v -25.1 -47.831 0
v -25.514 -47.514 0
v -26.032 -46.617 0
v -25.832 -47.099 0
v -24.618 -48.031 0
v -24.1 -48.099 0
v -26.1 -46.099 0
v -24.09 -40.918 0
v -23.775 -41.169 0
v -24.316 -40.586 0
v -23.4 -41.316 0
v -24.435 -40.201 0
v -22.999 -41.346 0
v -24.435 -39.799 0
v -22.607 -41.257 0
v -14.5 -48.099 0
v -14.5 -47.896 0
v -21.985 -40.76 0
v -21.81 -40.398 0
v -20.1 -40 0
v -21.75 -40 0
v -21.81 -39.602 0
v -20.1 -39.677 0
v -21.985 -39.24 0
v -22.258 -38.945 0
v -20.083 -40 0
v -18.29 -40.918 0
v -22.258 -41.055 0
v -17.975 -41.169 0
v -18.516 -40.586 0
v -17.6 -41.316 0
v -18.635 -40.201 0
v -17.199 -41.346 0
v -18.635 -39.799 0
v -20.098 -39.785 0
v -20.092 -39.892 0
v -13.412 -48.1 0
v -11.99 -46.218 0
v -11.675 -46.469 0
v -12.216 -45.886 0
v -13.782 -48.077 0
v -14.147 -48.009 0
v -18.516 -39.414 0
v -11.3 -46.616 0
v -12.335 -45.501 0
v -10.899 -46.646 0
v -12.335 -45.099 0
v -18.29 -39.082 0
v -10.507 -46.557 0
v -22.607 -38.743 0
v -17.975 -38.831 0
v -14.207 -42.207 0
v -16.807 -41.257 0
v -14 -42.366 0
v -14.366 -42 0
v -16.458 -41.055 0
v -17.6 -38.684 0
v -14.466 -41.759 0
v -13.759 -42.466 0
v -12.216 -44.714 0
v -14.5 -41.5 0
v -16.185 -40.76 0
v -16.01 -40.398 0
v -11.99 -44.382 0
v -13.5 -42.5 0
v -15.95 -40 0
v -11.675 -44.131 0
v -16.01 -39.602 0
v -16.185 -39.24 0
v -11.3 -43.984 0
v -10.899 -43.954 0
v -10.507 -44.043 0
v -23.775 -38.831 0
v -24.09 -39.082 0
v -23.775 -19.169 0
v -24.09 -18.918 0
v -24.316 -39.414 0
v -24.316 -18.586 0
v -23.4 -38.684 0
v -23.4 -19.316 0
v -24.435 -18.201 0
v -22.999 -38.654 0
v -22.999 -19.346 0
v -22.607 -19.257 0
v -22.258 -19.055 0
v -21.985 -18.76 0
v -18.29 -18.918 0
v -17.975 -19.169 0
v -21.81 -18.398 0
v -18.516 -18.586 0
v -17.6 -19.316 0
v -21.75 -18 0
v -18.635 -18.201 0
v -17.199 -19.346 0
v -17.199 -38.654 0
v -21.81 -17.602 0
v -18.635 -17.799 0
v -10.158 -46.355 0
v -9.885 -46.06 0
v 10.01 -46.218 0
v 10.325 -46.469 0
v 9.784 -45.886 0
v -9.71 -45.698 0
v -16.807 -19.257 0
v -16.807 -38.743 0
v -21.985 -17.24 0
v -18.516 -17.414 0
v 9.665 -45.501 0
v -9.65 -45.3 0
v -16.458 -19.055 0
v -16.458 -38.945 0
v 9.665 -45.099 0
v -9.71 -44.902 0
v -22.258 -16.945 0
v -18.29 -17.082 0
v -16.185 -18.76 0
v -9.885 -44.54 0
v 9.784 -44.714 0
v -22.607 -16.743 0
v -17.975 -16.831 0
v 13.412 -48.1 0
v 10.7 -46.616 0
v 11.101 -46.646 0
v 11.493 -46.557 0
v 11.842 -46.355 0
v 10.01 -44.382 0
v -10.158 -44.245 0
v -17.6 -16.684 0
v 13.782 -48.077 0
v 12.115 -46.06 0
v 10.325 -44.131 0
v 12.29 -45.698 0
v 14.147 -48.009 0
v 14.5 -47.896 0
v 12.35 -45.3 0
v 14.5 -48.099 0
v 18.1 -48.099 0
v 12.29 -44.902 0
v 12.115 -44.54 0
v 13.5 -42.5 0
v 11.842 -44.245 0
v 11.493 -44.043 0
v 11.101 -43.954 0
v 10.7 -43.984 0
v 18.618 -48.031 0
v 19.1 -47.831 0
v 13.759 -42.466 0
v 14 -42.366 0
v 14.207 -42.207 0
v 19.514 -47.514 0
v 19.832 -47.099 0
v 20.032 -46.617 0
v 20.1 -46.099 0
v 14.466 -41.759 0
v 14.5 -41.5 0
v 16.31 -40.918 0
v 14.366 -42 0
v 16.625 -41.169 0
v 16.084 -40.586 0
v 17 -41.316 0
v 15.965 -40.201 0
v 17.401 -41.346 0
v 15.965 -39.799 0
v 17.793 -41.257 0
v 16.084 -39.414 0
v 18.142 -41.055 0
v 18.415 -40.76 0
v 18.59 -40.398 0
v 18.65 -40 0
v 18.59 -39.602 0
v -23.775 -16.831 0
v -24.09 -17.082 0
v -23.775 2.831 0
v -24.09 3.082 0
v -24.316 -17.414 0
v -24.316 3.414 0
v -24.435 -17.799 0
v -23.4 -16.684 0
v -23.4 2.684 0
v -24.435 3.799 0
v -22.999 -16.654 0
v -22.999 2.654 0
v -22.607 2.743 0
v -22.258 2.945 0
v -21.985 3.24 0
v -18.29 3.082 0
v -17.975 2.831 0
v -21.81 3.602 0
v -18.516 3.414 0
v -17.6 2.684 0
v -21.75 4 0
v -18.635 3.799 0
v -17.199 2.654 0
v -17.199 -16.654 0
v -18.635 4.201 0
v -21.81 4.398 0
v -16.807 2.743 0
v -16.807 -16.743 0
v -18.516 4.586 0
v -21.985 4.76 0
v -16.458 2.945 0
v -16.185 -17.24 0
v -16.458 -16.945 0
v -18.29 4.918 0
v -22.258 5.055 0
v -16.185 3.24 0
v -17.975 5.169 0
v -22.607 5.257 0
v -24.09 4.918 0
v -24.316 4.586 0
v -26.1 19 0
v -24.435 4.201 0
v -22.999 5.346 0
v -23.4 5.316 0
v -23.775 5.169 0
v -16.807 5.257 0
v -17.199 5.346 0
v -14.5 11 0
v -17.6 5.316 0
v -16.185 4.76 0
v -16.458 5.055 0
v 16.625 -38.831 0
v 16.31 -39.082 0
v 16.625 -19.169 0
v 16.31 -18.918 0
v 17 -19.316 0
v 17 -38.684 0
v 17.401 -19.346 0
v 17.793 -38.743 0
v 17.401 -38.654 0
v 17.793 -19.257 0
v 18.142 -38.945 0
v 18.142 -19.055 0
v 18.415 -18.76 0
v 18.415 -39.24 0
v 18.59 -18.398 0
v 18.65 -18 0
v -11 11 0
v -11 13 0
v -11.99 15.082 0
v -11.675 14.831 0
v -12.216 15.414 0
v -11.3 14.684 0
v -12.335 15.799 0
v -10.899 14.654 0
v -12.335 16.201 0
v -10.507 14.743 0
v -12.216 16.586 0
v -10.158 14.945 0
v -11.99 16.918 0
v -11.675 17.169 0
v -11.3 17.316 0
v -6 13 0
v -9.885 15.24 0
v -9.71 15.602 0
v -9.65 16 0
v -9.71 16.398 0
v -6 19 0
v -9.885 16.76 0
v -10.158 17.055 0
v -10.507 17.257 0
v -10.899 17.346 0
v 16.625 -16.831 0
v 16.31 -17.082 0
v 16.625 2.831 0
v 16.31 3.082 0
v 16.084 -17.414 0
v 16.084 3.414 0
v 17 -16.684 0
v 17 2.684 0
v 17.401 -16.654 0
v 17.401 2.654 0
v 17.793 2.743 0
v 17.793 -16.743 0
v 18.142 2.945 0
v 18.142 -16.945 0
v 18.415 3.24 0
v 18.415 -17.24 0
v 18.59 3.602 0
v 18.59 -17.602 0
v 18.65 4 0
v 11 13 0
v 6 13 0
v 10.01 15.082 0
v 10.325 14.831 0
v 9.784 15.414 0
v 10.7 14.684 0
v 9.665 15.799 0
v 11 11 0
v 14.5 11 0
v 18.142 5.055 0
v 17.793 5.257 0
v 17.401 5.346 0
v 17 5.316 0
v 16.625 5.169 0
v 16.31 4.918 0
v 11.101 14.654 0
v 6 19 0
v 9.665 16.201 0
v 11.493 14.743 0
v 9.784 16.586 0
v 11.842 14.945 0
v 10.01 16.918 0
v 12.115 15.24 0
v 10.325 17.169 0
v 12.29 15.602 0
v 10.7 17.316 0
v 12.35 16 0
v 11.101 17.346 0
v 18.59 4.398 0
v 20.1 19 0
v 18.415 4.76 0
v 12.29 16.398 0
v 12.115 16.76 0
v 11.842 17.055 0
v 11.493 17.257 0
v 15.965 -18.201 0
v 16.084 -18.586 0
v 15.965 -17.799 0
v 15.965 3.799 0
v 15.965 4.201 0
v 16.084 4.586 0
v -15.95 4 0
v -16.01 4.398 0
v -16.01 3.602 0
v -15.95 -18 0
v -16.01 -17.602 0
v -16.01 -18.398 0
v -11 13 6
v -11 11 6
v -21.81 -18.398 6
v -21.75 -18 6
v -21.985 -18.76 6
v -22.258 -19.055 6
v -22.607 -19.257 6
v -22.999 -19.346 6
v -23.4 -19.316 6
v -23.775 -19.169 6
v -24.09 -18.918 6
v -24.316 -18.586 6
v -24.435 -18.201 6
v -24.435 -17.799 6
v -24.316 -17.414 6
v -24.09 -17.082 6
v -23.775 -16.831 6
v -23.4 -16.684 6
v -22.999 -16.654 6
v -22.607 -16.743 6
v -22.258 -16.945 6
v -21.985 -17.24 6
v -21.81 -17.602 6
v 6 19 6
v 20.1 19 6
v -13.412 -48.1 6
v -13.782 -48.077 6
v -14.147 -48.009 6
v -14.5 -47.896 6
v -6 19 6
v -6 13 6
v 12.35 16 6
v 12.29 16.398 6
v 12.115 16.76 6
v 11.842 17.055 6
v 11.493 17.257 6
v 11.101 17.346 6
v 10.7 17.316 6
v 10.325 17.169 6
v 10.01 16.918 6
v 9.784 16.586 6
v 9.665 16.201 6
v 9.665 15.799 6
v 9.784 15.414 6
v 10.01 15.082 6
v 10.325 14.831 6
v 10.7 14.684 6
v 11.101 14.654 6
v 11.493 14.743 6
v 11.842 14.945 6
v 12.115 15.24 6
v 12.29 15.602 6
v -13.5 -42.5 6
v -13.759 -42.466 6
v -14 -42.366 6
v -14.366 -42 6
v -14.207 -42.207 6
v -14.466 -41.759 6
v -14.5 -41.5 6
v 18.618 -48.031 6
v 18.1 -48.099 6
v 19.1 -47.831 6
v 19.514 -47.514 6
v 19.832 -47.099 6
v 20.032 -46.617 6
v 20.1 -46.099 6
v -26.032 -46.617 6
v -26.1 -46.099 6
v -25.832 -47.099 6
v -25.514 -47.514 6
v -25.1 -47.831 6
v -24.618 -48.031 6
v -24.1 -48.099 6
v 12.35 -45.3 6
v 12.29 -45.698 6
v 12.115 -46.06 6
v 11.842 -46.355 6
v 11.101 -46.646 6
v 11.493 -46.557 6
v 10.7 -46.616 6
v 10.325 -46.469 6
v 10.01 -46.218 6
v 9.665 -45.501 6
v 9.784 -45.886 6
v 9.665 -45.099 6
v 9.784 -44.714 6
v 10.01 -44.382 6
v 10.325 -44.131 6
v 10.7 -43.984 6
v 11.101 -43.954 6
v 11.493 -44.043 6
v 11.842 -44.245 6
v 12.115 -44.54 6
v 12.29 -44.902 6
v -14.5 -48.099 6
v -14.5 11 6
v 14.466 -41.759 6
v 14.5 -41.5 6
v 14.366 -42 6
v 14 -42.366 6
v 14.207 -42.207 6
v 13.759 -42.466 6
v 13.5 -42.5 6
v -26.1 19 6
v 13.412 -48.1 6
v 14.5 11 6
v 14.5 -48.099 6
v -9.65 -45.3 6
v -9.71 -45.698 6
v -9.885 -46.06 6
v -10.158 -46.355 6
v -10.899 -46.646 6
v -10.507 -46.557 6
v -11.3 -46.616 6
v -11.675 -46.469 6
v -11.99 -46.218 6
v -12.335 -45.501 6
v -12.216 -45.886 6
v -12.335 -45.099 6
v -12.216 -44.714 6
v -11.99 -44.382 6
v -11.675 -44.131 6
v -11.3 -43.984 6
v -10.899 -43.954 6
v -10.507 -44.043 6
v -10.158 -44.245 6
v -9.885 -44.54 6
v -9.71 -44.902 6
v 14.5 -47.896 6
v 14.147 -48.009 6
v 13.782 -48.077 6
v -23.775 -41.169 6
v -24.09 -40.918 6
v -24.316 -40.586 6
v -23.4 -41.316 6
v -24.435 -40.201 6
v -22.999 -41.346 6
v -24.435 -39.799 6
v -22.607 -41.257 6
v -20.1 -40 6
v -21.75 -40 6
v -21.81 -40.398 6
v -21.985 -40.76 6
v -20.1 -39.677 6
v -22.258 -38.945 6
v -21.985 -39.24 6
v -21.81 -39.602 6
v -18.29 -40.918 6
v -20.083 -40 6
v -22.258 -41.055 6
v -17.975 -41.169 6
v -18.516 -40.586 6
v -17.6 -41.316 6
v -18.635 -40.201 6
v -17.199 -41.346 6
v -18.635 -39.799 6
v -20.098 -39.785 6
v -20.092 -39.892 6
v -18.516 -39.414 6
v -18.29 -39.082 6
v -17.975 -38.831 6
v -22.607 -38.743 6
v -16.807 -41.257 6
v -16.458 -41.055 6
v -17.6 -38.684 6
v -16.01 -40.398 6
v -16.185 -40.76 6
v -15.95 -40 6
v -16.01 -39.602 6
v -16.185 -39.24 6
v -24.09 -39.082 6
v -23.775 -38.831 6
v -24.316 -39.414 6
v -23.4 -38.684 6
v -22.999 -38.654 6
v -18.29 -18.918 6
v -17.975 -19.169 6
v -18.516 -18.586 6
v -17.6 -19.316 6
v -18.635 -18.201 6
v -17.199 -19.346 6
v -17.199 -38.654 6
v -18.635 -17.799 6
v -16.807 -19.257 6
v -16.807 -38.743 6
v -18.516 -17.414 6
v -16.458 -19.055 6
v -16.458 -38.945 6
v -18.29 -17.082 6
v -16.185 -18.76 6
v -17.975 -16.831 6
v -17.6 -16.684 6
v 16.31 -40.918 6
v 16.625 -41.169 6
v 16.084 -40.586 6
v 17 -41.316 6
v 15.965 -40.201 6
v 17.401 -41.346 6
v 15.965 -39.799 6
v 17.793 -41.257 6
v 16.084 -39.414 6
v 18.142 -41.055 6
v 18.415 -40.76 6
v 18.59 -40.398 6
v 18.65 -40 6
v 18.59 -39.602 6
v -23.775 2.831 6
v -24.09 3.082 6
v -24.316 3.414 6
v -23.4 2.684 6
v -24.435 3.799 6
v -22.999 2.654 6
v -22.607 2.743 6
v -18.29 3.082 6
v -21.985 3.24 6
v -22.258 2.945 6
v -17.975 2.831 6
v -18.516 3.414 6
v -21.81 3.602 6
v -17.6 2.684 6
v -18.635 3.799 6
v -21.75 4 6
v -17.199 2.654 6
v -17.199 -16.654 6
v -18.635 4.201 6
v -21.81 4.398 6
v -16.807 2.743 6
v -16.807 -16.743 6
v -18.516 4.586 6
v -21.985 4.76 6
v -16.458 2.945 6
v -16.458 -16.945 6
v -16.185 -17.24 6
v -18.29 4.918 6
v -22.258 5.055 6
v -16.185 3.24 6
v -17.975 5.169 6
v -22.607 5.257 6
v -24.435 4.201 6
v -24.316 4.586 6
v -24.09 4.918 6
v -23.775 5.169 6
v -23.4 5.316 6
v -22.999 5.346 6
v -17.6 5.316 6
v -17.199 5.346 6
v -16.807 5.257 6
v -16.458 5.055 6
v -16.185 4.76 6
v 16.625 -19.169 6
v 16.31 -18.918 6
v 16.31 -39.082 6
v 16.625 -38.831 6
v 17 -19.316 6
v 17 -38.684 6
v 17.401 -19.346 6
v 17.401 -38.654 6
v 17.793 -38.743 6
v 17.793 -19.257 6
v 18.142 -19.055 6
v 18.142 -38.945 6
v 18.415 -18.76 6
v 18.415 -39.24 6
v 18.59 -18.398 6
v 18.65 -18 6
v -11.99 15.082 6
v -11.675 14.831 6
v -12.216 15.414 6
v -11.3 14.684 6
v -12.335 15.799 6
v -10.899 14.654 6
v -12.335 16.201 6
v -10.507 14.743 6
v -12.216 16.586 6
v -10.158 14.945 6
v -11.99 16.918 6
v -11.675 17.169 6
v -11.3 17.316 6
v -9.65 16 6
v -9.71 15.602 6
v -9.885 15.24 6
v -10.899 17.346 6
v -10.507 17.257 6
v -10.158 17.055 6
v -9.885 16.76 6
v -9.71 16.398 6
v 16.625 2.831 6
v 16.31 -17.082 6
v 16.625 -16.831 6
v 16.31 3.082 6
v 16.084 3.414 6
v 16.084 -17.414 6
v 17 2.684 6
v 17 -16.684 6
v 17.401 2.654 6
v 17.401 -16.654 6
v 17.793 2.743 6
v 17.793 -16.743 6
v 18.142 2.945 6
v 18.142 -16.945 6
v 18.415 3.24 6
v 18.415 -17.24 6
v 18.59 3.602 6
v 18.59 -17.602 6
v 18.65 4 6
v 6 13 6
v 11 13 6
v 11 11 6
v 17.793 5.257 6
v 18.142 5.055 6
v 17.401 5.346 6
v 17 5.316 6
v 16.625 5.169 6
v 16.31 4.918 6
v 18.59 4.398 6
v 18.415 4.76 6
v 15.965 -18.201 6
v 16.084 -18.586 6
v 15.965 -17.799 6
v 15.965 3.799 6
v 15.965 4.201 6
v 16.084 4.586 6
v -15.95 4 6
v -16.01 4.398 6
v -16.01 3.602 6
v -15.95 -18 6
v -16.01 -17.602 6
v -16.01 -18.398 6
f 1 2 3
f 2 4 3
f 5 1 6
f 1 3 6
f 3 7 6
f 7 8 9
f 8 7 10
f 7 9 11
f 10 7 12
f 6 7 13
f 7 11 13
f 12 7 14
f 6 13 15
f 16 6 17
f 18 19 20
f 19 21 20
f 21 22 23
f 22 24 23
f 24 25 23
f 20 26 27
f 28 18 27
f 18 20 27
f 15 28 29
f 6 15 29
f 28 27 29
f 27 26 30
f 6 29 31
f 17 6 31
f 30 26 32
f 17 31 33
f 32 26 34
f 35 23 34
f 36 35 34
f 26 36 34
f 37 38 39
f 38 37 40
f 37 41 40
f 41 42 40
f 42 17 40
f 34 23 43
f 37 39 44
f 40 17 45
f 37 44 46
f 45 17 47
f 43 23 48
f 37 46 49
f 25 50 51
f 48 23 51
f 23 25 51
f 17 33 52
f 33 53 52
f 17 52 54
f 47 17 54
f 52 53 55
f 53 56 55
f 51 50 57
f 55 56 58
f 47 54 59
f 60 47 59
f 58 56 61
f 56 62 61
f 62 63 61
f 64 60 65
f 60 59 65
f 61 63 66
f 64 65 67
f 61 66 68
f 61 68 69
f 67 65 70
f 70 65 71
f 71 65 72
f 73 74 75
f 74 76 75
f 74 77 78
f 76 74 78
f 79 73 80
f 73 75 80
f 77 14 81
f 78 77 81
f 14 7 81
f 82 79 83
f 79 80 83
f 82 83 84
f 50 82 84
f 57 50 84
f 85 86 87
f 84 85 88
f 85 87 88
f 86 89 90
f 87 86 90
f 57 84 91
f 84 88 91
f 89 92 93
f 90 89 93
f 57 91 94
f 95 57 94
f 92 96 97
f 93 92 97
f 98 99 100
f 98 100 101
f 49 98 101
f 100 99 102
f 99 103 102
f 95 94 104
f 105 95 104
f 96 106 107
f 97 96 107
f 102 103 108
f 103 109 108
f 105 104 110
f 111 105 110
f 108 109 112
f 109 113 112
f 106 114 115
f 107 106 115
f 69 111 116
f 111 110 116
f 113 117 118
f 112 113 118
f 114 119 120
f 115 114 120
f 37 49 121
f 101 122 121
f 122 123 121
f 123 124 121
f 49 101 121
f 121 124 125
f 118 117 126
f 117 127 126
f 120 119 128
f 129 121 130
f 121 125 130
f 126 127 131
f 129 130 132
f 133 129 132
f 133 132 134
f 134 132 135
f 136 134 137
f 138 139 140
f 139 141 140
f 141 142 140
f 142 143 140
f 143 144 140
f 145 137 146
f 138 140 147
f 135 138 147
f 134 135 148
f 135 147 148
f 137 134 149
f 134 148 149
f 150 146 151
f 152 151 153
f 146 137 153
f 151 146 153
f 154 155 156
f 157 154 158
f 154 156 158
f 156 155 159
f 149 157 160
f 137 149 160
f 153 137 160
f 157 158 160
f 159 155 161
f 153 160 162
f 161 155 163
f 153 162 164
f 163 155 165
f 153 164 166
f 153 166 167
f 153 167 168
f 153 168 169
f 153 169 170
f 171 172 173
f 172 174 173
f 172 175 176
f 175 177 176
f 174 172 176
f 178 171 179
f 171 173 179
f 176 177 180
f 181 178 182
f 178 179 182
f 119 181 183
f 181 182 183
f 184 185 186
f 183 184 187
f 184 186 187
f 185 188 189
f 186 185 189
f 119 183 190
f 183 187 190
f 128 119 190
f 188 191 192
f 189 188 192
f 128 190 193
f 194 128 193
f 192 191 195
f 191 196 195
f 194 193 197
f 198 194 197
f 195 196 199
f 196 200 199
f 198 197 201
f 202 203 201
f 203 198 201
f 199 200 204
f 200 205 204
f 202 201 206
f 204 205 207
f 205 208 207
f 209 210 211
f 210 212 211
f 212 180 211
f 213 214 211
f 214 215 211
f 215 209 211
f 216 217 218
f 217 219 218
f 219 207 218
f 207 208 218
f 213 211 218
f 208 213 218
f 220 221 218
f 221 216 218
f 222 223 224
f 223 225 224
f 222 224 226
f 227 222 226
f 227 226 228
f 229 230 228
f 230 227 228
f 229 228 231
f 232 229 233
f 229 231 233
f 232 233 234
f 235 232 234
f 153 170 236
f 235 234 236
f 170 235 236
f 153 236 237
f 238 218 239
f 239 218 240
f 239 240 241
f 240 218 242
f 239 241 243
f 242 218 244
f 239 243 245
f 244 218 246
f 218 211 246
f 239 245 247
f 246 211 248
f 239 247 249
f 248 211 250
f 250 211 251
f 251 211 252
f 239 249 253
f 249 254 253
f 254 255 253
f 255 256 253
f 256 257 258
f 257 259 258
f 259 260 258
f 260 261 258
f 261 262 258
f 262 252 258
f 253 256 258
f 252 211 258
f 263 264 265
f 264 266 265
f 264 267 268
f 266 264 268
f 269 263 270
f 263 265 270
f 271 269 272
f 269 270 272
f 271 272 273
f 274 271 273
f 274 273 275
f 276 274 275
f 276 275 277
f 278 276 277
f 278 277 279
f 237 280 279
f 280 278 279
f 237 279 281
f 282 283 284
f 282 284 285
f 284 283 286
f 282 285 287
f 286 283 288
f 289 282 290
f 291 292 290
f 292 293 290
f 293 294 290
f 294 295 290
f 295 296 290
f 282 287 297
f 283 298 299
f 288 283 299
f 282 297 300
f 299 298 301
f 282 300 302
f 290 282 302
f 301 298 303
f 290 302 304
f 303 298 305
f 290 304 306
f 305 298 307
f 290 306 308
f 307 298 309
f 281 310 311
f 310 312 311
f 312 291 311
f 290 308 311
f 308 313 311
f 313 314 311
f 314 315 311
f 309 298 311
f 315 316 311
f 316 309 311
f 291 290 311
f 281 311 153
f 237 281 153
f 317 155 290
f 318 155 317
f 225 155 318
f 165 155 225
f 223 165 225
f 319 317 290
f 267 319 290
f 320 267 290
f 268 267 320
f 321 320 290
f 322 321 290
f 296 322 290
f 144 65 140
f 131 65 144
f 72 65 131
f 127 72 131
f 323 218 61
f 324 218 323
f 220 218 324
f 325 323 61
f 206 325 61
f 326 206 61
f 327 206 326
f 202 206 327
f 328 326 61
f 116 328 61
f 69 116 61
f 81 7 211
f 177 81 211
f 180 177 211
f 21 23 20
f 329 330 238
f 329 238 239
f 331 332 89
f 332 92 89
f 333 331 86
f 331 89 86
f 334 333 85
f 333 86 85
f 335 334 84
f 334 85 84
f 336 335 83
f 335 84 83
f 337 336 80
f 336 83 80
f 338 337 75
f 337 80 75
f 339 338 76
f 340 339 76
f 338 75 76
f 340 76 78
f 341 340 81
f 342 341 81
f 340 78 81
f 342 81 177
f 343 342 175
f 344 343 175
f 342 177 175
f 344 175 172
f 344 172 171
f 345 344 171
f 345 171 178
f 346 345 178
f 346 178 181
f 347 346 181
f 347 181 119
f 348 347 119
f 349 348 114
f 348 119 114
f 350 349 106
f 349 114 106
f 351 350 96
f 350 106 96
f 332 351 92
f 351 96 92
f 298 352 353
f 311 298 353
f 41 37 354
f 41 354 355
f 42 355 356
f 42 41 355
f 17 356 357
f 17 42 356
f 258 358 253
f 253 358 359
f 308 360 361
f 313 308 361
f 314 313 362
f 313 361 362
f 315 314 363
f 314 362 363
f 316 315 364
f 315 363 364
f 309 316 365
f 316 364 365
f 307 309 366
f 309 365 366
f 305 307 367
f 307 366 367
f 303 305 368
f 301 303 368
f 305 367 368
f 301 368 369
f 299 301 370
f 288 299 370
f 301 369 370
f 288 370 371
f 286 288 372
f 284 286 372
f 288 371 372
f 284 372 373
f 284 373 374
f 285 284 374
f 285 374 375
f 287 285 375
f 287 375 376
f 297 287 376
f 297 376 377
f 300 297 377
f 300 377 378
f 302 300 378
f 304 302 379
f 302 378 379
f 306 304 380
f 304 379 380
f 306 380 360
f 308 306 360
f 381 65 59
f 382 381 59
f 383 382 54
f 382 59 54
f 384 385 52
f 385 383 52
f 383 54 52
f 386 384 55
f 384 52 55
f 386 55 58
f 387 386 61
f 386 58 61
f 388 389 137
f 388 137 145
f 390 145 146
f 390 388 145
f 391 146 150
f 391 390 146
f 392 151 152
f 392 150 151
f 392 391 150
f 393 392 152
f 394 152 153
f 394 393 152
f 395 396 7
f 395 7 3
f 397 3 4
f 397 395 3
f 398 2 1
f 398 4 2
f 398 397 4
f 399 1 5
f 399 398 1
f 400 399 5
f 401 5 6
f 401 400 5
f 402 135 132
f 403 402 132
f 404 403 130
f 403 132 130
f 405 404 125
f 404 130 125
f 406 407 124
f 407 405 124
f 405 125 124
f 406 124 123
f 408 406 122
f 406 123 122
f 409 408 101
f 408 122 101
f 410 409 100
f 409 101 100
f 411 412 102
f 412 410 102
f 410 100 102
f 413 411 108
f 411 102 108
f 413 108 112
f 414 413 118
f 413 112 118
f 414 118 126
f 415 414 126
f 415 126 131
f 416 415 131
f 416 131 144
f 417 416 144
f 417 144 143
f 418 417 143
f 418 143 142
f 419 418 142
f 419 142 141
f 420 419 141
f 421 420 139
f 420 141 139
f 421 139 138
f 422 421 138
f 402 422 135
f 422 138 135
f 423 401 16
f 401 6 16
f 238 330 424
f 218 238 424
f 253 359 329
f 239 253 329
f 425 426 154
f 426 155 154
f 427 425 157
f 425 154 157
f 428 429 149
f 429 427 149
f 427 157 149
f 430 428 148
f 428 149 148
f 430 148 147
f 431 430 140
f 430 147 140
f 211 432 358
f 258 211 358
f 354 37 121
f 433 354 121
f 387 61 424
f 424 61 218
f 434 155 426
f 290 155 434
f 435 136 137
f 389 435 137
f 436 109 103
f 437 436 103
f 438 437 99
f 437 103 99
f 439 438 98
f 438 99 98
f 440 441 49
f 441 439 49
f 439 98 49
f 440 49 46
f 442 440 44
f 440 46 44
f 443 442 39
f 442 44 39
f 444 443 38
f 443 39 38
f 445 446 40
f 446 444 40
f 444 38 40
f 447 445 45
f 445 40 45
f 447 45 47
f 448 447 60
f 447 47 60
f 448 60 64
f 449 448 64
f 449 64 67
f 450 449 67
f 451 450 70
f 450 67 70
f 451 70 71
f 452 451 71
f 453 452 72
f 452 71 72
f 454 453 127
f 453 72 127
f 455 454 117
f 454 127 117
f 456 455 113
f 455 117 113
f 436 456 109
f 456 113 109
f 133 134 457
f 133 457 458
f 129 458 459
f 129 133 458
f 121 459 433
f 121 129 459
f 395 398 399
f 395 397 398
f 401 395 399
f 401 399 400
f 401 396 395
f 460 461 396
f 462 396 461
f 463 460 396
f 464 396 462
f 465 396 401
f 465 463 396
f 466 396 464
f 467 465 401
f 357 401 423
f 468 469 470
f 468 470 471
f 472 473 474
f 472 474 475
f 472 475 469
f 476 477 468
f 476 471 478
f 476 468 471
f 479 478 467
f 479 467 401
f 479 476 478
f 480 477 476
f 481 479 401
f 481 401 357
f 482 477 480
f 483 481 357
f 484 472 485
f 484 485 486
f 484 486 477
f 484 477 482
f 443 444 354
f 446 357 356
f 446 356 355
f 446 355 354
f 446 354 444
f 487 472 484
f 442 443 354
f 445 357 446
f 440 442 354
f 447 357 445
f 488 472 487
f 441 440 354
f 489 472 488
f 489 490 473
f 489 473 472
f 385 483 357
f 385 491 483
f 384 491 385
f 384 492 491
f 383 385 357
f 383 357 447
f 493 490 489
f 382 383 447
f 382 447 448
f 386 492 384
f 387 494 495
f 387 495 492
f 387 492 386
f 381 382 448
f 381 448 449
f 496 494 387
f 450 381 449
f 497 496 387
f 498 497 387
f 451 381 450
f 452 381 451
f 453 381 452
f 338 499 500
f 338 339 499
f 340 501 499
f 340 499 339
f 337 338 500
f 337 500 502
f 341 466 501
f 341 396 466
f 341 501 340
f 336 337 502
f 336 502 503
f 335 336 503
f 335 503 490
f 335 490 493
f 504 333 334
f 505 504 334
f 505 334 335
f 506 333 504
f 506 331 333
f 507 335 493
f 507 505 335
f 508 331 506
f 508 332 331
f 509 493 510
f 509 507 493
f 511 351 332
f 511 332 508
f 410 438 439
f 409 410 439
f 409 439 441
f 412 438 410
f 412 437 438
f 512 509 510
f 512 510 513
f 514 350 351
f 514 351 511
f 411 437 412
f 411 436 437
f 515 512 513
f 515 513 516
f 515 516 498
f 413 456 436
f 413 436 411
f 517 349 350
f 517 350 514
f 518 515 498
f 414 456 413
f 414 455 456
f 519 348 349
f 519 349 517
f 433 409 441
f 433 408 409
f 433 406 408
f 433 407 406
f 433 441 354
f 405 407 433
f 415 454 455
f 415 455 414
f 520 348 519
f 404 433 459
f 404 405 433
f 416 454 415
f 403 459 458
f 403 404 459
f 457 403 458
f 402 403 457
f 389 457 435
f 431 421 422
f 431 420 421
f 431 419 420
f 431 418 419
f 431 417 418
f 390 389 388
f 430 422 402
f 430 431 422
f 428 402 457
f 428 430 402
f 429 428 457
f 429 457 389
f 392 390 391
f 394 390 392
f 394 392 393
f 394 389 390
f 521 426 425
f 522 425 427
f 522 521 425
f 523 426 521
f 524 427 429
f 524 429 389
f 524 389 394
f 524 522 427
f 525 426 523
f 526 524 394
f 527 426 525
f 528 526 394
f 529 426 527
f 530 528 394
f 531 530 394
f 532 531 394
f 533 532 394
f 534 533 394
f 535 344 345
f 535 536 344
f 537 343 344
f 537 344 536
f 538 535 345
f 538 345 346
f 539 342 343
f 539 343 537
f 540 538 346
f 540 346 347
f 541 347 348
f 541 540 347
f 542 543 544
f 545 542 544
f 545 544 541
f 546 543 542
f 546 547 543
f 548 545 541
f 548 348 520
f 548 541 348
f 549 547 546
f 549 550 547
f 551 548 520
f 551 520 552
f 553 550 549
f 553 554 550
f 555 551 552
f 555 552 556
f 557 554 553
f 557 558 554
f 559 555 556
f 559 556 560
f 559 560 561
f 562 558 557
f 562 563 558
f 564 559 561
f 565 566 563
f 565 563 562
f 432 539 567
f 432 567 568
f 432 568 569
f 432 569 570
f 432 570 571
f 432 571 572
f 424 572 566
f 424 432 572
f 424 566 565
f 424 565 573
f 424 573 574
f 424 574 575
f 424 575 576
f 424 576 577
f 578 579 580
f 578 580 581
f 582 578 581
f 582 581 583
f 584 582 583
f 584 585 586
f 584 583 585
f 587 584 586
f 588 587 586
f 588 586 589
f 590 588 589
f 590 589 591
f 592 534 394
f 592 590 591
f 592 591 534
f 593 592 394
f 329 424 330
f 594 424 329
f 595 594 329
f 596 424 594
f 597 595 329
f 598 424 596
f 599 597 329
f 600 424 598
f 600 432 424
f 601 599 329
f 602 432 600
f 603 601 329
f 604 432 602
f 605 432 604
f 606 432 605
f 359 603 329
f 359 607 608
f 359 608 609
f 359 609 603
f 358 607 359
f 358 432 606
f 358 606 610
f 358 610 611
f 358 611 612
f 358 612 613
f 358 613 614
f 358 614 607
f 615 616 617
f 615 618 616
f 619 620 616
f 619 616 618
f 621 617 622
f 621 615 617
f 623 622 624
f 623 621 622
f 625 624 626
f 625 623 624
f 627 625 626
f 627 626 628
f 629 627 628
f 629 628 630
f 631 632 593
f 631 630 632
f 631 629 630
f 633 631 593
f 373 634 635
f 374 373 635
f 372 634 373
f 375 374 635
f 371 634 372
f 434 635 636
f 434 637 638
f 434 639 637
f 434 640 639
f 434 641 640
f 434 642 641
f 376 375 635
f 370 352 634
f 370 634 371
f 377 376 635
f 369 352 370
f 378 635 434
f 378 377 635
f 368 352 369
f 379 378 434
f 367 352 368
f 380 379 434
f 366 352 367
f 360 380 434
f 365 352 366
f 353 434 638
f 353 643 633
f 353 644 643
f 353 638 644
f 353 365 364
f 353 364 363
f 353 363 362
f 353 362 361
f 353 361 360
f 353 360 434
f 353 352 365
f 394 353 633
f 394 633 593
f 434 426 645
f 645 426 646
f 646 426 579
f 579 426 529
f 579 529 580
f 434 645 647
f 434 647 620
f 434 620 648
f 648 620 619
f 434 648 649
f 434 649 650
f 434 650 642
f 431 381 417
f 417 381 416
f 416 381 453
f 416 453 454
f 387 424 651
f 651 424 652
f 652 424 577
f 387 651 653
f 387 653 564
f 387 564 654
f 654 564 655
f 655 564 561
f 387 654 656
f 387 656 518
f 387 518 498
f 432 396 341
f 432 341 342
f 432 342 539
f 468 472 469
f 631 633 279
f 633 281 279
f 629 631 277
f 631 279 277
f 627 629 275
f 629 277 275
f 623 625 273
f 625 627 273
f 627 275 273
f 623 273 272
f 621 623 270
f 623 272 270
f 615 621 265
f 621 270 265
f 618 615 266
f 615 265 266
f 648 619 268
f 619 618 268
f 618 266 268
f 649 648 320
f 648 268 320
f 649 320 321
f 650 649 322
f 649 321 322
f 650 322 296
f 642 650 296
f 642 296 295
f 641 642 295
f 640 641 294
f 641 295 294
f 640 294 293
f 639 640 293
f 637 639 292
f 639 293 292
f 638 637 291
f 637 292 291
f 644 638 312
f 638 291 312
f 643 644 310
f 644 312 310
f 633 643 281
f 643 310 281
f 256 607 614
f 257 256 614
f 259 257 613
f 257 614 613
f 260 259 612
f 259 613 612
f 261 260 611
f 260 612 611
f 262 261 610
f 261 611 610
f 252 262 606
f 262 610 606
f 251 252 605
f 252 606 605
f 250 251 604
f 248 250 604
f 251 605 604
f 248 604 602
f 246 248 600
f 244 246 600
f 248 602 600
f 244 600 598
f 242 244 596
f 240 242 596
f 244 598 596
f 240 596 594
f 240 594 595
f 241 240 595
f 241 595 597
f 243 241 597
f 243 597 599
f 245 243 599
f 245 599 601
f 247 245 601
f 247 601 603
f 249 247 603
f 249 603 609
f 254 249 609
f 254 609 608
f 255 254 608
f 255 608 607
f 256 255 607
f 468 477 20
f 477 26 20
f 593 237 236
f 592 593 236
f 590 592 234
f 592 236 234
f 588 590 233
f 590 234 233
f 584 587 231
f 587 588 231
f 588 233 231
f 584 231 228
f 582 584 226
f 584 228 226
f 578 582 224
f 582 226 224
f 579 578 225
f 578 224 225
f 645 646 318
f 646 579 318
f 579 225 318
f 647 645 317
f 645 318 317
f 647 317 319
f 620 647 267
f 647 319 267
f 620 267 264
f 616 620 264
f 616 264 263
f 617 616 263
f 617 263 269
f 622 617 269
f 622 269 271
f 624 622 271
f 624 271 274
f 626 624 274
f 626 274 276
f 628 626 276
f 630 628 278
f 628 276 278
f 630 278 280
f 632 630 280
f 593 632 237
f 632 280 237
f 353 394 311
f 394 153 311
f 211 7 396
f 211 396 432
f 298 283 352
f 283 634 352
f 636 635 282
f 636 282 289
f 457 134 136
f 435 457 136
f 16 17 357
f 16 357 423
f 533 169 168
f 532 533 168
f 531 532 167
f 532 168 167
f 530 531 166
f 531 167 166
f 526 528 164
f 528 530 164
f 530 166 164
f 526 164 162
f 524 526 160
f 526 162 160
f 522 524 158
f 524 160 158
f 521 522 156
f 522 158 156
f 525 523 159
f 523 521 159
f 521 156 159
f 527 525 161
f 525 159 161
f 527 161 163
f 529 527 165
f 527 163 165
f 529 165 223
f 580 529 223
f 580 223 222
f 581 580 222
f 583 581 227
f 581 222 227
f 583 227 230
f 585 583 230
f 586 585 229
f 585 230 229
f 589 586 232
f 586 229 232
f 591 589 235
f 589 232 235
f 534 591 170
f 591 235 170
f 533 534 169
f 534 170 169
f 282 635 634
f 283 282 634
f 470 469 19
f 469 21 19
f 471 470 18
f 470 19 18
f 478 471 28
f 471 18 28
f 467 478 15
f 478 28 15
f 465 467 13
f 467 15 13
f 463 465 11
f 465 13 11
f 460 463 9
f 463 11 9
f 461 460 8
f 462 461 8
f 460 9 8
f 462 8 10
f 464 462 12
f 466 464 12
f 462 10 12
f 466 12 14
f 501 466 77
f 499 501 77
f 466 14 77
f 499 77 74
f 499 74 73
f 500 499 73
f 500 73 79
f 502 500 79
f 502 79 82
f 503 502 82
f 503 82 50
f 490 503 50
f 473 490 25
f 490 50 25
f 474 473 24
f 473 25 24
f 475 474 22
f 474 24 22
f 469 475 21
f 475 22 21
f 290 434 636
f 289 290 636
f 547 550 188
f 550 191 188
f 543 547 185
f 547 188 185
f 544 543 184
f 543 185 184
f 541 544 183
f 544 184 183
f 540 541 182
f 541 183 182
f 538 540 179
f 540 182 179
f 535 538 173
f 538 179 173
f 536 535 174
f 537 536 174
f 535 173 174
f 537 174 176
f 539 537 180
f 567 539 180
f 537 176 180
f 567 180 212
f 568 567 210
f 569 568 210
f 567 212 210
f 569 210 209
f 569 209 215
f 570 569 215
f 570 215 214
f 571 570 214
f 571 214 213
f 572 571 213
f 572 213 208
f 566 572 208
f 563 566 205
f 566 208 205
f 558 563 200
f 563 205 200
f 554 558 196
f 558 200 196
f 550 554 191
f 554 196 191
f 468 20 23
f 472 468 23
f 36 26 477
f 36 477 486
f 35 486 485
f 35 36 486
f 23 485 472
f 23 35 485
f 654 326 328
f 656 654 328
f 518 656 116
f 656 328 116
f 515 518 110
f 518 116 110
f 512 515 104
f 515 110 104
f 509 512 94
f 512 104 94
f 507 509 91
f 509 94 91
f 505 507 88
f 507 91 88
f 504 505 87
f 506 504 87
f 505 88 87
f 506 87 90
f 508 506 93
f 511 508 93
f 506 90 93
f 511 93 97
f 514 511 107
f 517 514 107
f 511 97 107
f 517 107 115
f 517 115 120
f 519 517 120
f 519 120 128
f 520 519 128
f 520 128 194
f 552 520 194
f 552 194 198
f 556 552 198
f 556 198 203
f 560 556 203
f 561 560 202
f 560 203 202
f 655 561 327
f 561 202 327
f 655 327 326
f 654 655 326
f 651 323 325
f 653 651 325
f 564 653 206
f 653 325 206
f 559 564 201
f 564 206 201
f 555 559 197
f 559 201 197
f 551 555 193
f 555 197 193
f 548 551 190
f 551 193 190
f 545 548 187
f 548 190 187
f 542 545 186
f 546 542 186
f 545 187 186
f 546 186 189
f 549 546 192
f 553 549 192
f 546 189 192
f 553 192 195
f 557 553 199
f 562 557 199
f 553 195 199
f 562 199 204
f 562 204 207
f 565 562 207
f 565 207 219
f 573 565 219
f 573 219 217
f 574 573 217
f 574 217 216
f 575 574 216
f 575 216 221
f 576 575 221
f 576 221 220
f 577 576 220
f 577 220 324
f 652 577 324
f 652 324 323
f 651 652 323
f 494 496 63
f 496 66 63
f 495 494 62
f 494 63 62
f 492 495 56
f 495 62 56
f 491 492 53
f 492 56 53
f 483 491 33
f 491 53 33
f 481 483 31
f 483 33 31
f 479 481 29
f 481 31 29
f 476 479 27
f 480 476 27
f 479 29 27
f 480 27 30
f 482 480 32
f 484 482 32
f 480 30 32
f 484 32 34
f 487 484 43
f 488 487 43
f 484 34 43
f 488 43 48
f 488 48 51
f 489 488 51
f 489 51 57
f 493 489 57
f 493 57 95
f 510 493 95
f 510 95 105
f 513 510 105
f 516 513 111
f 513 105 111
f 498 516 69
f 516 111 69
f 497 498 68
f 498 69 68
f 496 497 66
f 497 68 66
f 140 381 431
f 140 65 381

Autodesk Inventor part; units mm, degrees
ref_plane "YZ Plane" through (0, 0, 0) normal (1, 0, 0) x (0, 1, 0)
ref_plane "XZ Plane" through (0, 0, 0) normal (0, 1, 0) x (-1, 0, 0)
ref_plane "XY Plane" through (0, 0, 0) normal (0, 0, 1) x (1, 0, 0)
ref_plane "작업 평면1" through (0, 0, 0) normal (0, 0, 1) x (1, 0, 0)
sketch "스케치1" plane through (0, 0, 0) normal (0, 0, 1) x (1, 0, 0)
  arc A0 (20.1, 4.5766) -> (19.5808, 6.2636) centre (17.1, 4.5766) ccw projected
  line L0 (19.5808, 6.2636) -> (15.5953, 12.1246) projected
  arc A1 (15.5953, 12.1246) -> (13.9414, 13) centre (13.9414, 11) ccw projected
  line L1 (13, 13) -> (13.9414, 13) projected
  arc A2 (14.5, 11.5) -> (13, 13) centre (13, 11.5) ccw projected
  line L2 (14.5, -41.5) -> (14.5, 11.5) projected
  arc A3 (13.5, -42.5) -> (14.5, -41.5) centre (13.5, -41.5) ccw projected
  line L3 (-13.5, -42.5) -> (13.5, -42.5) projected
  arc A4 (-14.5, -41.5) -> (-13.5, -42.5) centre (-13.5, -41.5) ccw projected
  line L4 (-14.5, 11.5) -> (-14.5, -41.5) projected
  arc A5 (-13, 13) -> (-14.5, 11.5) centre (-13, 11.5) ccw projected
  line L5 (-13.9414, 13) -> (-13, 13) projected
  arc A6 (-13.9414, 13) -> (-15.5953, 12.1246) centre (-13.9414, 11) ccw projected
  line L6 (-15.5953, 12.1246) -> (-19.5808, 6.2636) projected
  arc A7 (-19.5808, 6.2636) -> (-20.1, 4.5766) centre (-17.1, 4.5766) ccw projected
  line L7 (-20.1, 4.5766) -> (-20.1, -39.6766) projected
  arc A8 (-20.1, -39.6766) -> (-19.5808, -41.3636) centre (-17.1, -39.6766) ccw projected
  line L8 (-19.5808, -41.3636) -> (-15.8929, -46.7869) projected
  arc A9 (-15.8929, -46.7869) -> (-13.4121, -48.1) centre (-13.4121, -45.1) ccw projected
  line L9 (-13.4121, -48.1) -> (13.4121, -48.1) projected
  arc A10 (13.4121, -48.1) -> (15.8929, -46.7869) centre (13.4121, -45.1) ccw projected
  line L10 (15.8929, -46.7869) -> (19.5808, -41.3636) projected
  arc A11 (19.5808, -41.3636) -> (20.1, -39.6766) centre (17.1, -39.6766) ccw projected
  line L11 (20.1, -39.6766) -> (20.1, 4.5766) projected
  circle A12 centre (-17.3, 4) radius 1.35 projected
  circle A13 centre (-17.3, -18) radius 1.35 projected
  circle A14 centre (-11, -45.3) radius 1.35 projected
  circle A15 centre (17.3, 4) radius 1.35 projected
  circle A16 centre (17.3, -18) radius 1.35 projected
  circle A17 centre (11, -45.3) radius 1.35 projected
  circle A18 centre (-17.3, -40) radius 1.35 projected
  circle A19 centre (17.3, -40) radius 1.35 projected
  line L12 (-20.1, -48.0993) -> (-20.1, 25.0993) projected
  line L13 (-20.1, 25.0993) -> (-26.1, 25.0993) projected
  line L14 (-26.1, -48.0993) -> (-26.1, 25.0993) projected
  line L15 (-20.1, -48.0993) -> (-26.1, -48.0993) projected
  line L16 (-14.5, 11.5) -> (-14.5, 13.7353)
  line L17 (-13.9414, 13) -> (-15.2676, 13)
  line L18 (-14.5, -41.5) -> (-14.5, -54.5935)
  line L19 (-20.1, -48.0993) -> (-13.475, -48.0993)
  line L20 (-13.475, -48.0993) -> (-26.1, -48.0993)
  line L21 (-26.1, -48.0993) -> (-26.1, 13)
  line L22 (-26.1, 13) -> (-13.475, 13)
  line L23 (-13.475, 13) -> (-13.475, -48.0993)
  line L24 (-17.3, 4) -> (-17.3, -18)
  line L25 (-17.3, -18) -> (-23.1, -18)
  line L26 (-23.1, -18) -> (-23.1, 4)
  line L27 (-23.1, 4) -> (-17.3, 4)
  line L28 (-17.3, -18) -> (-17.3, -40)
  line L29 (-17.3, -40) -> (-23.1, -40)
  line L30 (-23.1, -40) -> (-23.1, -18)
  line L31 (-23.1, -18) -> (-17.3, -18)
  circle A20 centre (-23.1, 4) radius 1.35
  circle A21 centre (-23.1, -18) radius 1.35
  circle A22 centre (-23.1, -40) radius 1.35
  line L32 (14.5, 13) -> (14.5, -48.0993)
  line L33 (14.5, -48.0993) -> (20.1, -48.0993)
  line L34 (20.1, -48.0993) -> (20.1, 13)
  line L35 (20.1, 13) -> (14.5, 13)
  circle A23 centre (-23.1, 4) radius 1.35 projected
  circle A24 centre (-23.1, -18) radius 1.35 projected
  circle A25 centre (-23.1, -40) radius 1.35 projected
  point P0 (0, 0)
  point P1 (-14.5, 13)
  point P2 (20.1, 4.5766)
  point P3 (14.5, 11.5)
  point P4 (-26.1, 13)
  point P5 (-14.5, -48.0993)
  point P6 (-14.5, -47.8958)
  point P7 (14.5, -47.8958)
  point P8 (20.1, -39.6766)
  point P9 (-20.0825, -40)
  point P10 (-20.1, -40)
  dimension "d0" = 2.7
  dimension "d1" = 2.7
  dimension "d2" = 2.7
extrude "돌출1" add sketch "스케치1" along normal blind 6 contours L11 A11 L10 A10 L32 L2 A1 L0 A0 | A0 L0 A1 L32 L35 L34 | L34 L33 L32 A10 L10 A11 | A10 L9 A9 L23 L3 A3 L32 | L23 A9 L18 A4 L3 | L18 L19 L12 L29 A8 L8 A9 | A9 L8 A8 L29 A18 L28 A13 L24 A12 L27 L7 A7 L6 A6 L16 L4 L18 | L15 L14 L22 L12 L7 L27 A20 L26 A21 L30 A22 L29 | A6 L6 A7 L12 L22 L17 L16 | L29 A22 L30 A21 L25 L7 L12 | A8 L7 L25 A13 L28 A18 L29 | L25 A21 L26 A20 L27 L7 | L7 L27 A12 L24 A13 L25
fillet "모깎기1" radius 2 6 edges at (-26.1, -48.0993, 3) (20.1, -48.0993, 3) (20.1, 13, 3) (14.5, 13, 3) (-14.5, 13, 3) (-26.1, 13, 3)
sketch "스케치2" plane through (0, 0, 6) normal (0, 0, 1) x (1, 0, 0)
  line L0 (-13, 13) -> (-13, 19) projected
  line L1 (13, 13) -> (-13, 13) projected
  line L2 (13, 13) -> (13, 19) projected
  line L3 (-13, 19) -> (13, 19) projected
  arc A0 (-24.1, 13) -> (-26.1, 11) centre (-24.1, 11) ccw projected
  line L4 (-26.1, 11) -> (-26.1, -46.0993) projected
  arc A1 (-26.1, -46.0993) -> (-24.1, -48.0993) centre (-24.1, -46.0993) ccw projected
  line L5 (-24.1, -48.0993) -> (-14.5, -48.0993) projected
  line L6 (-14.5, -48.0993) -> (-14.5, -47.8958) projected
  arc A2 (-14.5, -47.8958) -> (-13.4121, -48.1) centre (-13.4121, -45.1) ccw projected
  line L7 (-13.4121, -48.1) -> (13.4121, -48.1) projected
  arc A3 (13.4121, -48.1) -> (14.5, -47.8958) centre (13.4121, -45.1) ccw projected
  line L8 (14.5, -47.8958) -> (14.5, -48.0993) projected
  line L9 (14.5, -48.0993) -> (18.1, -48.0993) projected
  arc A4 (18.1, -48.0993) -> (20.1, -46.0993) centre (18.1, -46.0993) ccw projected
  line L10 (20.1, -46.0993) -> (20.1, 11) projected
  arc A5 (20.1, 11) -> (18.1, 13) centre (18.1, 11) ccw projected
  line L11 (18.1, 13) -> (16.5, 13) projected
  arc A6 (16.5, 13) -> (14.5, 11) centre (16.5, 11) ccw projected
  line L12 (14.5, 11) -> (14.5, -41.5) projected
  arc A7 (13.5, -42.5) -> (14.5, -41.5) centre (13.5, -41.5) ccw projected
  line L13 (13.5, -42.5) -> (-13.5, -42.5) projected
  arc A8 (-14.5, -41.5) -> (-13.5, -42.5) centre (-13.5, -41.5) ccw projected
  line L14 (-14.5, -41.5) -> (-14.5, 11) projected
  arc A9 (-14.5, 11) -> (-16.5, 13) centre (-16.5, 11) ccw projected
  line L15 (-16.5, 13) -> (-24.1, 13) projected
  circle A10 centre (-17.3, -18) radius 1.35 projected
  circle A11 centre (-23.1, 4) radius 1.35 projected
  circle A12 centre (-23.1, -18) radius 1.35 projected
  circle A13 centre (11, -45.3) radius 1.35 projected
  circle A14 centre (-11, -45.3) radius 1.35 projected
  circle A15 centre (-17.3, 4) radius 1.35 projected
  circle A16 centre (-17.3, -40) radius 1.35 projected
  circle A17 centre (17.3, -18) radius 1.35 projected
  circle A18 centre (17.3, 4) radius 1.35 projected
  circle A19 centre (17.3, -40) radius 1.35 projected
  arc A20 (-20.1, -39.6766) -> (-20.0825, -40) centre (-17.1, -39.6766) ccw projected
  line L16 (-20.0825, -40) -> (-20.1, -40) projected
  line L17 (-20.1, -40) -> (-20.1, -39.6766) projected
  circle A21 centre (-23.1, -40) radius 1.35 projected
  line L18 (18.1, 11) -> (-24.1, 11)
  line L19 (-24.1, 11) -> (-26.1, 11)
  line L20 (18.1, 11) -> (20.1, 11)
  line L21 (20.1, 11) -> (-26.1, 11)
  line L22 (-26.1, 11) -> (-26.1, 19)
  line L23 (-26.1, 19) -> (20.1, 19)
  line L24 (20.1, 19) -> (20.1, 11)
  line L25 (11, -45.3) -> (-11, -45.3)
  line L26 (-11, -45.3) -> (-11, 16)
  line L27 (-11, 16) -> (11, 16)
  line L28 (11, 16) -> (11, -45.3)
  circle A22 centre (11, 16) radius 1.35
  circle A23 centre (-11, 16) radius 1.35
  line L29 (11, 16) -> (6, 16)
  line L30 (-11, 16) -> (-6, 16)
  line L31 (6, 13) -> (6, 19)
  line L32 (6, 19) -> (-6, 19)
  line L33 (-6, 19) -> (-6, 13)
  line L34 (-6, 13) -> (6, 13)
  point P0 (0, 0)
  point P1 (11, 13)
  point P2 (11, 11)
  point P3 (-11, 13)
  point P4 (-14.5, 11)
  point P5 (-11, 11)
  dimension "d6" = 2.7
  dimension "d7" = 2.7
  dimension "d8" = 5
  dimension "d9" = 5
extrude "돌출2" add sketch "스케치2" against normal blind 6 contours L1 L26 L18 A9 L15 A0 L22 L23 L0 | L0 L3 L33 L27 A23 L26 L1 | L26 A23 L27 L33 L1 | L3 L2 L1 L28 A22 L27 L31 | L31 L27 A22 L28 L1 | L28 L1 L2 L23 L24 A5 L11 A6 L18
properties part number "_body_side_ver2" material "PMMA 플라스틱"
